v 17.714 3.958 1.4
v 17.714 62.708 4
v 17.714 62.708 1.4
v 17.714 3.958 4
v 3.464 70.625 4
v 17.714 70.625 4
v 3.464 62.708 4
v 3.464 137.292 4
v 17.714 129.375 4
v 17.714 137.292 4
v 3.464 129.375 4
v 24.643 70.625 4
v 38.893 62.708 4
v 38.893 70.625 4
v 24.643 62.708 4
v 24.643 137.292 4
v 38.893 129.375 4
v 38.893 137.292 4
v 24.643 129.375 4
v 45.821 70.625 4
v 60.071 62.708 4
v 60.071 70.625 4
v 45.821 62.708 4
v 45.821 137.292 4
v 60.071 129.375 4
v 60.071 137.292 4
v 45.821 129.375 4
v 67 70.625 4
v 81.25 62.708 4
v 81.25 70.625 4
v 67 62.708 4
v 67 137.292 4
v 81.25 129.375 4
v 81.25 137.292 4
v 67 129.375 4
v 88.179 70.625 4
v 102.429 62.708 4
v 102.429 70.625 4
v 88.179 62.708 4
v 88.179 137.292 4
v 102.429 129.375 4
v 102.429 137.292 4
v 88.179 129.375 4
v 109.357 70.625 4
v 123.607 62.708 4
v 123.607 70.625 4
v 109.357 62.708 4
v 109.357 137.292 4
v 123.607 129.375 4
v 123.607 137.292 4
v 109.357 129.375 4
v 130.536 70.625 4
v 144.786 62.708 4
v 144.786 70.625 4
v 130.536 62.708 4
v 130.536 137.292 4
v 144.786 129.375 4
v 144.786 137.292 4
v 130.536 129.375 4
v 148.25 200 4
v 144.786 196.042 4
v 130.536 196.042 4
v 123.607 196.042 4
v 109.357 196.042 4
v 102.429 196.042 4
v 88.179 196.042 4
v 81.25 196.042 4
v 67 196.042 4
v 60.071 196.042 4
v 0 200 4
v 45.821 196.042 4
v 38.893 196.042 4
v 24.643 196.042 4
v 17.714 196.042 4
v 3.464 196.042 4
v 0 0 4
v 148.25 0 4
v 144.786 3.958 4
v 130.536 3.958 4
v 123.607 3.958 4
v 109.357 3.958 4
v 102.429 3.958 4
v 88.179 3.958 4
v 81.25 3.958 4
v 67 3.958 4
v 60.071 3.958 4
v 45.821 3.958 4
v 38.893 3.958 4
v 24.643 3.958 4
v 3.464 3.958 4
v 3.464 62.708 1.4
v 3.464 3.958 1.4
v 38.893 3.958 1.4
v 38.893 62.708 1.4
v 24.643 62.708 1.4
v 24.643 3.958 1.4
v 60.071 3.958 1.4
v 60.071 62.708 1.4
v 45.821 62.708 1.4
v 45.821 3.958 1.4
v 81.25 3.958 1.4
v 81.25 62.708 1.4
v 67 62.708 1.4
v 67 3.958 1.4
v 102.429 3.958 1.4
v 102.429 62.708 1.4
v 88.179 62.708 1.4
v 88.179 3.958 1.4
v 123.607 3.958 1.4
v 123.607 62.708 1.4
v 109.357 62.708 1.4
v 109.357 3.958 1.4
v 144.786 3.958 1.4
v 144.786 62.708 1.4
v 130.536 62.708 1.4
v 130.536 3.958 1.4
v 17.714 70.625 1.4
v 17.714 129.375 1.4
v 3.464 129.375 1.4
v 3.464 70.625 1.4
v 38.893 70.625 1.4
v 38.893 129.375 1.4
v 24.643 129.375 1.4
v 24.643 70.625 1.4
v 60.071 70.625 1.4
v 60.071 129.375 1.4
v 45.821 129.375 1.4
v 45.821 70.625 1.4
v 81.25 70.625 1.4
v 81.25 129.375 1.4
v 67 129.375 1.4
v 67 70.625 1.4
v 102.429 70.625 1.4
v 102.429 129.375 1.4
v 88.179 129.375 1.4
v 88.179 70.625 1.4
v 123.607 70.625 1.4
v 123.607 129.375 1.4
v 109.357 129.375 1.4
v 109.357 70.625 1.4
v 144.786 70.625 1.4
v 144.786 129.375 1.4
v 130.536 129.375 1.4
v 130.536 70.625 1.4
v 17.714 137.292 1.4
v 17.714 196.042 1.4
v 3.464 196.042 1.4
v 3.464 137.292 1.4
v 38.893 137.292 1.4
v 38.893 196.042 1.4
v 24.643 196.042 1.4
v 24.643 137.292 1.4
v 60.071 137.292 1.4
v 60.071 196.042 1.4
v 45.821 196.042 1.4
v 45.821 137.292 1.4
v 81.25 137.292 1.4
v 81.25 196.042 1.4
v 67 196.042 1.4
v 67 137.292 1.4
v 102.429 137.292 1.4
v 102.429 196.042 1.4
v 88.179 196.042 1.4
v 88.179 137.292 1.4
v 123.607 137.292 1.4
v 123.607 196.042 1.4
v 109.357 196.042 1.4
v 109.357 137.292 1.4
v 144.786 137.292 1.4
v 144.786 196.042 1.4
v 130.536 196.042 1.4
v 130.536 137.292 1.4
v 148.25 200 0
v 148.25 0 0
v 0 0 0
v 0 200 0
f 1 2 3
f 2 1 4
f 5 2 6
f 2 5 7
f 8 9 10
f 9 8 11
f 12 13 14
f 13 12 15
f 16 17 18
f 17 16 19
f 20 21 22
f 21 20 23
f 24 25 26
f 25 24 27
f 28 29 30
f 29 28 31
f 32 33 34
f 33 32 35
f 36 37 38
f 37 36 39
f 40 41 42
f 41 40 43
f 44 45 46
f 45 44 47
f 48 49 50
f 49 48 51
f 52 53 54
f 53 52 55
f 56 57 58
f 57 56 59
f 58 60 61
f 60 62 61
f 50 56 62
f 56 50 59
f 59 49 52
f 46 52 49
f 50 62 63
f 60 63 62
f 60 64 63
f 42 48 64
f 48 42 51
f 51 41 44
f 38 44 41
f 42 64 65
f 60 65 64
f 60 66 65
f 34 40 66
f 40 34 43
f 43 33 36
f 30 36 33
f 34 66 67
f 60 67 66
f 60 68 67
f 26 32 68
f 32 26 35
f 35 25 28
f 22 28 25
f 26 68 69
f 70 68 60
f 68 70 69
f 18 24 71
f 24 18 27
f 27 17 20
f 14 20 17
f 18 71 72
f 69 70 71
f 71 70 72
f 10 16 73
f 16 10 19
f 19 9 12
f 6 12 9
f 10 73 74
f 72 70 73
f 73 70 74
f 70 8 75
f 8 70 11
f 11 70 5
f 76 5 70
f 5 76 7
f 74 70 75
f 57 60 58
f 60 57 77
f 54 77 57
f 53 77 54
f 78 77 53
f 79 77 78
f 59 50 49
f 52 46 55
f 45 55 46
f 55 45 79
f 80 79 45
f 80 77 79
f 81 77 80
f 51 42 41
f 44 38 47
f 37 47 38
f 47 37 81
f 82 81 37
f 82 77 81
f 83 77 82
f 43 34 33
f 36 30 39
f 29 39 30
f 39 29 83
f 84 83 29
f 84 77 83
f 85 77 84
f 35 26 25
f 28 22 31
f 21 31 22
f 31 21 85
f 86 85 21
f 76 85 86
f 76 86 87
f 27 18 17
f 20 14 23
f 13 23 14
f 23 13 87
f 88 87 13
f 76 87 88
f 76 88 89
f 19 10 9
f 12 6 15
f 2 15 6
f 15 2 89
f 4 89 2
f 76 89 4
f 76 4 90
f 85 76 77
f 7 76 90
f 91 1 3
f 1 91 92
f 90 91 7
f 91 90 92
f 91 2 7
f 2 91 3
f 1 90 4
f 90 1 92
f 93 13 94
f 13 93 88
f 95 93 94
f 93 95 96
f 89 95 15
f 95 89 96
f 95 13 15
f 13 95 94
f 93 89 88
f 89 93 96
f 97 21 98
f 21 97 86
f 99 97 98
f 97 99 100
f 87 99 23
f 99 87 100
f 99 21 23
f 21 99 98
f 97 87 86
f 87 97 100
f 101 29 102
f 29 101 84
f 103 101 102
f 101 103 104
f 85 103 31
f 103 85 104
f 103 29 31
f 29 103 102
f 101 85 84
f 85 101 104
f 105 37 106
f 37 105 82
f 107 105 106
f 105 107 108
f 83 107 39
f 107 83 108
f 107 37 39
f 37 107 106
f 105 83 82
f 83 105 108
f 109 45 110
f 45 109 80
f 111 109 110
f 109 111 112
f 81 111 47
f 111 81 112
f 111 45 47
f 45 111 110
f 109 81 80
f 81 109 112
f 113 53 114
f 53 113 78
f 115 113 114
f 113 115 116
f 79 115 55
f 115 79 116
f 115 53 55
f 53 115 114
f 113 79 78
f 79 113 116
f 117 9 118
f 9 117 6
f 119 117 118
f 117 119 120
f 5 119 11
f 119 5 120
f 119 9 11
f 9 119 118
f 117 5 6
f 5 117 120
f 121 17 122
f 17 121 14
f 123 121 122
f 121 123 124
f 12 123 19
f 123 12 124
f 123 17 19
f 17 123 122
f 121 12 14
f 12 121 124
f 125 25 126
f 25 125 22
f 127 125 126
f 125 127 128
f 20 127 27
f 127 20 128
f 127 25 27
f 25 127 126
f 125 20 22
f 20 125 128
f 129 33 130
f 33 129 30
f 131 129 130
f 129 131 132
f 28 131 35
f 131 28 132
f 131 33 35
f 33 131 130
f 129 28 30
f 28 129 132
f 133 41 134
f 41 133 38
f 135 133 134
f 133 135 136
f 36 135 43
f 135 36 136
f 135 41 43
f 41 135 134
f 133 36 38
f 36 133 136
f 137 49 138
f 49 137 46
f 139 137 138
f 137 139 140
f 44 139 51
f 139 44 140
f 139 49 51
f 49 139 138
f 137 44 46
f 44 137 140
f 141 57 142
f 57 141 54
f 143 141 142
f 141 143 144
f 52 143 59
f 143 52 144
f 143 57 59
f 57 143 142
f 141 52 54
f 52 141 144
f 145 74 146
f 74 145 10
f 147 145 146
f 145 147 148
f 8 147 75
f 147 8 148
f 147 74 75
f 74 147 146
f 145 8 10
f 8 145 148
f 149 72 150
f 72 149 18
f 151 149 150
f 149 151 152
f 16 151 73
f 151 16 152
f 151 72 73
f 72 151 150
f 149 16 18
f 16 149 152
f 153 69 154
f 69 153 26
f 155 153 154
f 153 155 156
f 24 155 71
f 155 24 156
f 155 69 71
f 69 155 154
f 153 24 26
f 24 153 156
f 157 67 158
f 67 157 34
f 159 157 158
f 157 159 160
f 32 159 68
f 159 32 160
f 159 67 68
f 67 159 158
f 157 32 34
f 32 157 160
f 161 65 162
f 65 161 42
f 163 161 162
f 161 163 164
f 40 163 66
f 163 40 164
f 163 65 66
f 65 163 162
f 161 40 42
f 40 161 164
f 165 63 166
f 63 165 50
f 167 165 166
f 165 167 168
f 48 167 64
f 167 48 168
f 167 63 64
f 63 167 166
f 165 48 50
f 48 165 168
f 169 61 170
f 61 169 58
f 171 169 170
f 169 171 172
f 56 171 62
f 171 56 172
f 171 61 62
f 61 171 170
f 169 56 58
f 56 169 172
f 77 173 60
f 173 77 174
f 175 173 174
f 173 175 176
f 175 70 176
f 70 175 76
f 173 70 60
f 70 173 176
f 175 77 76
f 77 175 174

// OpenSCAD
item_width = 14.25;
item_length = 58.75;
item_depth = 2.6;

jig_width = 148.25;
jig_length = 200;
jig_depth = 4;

mold_area_width = jig_width / 7;
mold_area_length = jig_length / 3;

difference() {
    // Jig
    cube([
        jig_width,
        jig_length,
        jig_depth
    ]);
    
    // Items
    for (j = [0:2]) {
        for (i = [0:6]) {
            translate([
                mold_area_width * i + 1/2 * (mold_area_width - item_width),
                mold_area_length * j + 1/2 * (mold_area_length - item_length),
                jig_depth - item_depth
            ]) {
            cube([
                item_width,
                item_length,
                item_depth
            ]);
            }
        }
    }
}
